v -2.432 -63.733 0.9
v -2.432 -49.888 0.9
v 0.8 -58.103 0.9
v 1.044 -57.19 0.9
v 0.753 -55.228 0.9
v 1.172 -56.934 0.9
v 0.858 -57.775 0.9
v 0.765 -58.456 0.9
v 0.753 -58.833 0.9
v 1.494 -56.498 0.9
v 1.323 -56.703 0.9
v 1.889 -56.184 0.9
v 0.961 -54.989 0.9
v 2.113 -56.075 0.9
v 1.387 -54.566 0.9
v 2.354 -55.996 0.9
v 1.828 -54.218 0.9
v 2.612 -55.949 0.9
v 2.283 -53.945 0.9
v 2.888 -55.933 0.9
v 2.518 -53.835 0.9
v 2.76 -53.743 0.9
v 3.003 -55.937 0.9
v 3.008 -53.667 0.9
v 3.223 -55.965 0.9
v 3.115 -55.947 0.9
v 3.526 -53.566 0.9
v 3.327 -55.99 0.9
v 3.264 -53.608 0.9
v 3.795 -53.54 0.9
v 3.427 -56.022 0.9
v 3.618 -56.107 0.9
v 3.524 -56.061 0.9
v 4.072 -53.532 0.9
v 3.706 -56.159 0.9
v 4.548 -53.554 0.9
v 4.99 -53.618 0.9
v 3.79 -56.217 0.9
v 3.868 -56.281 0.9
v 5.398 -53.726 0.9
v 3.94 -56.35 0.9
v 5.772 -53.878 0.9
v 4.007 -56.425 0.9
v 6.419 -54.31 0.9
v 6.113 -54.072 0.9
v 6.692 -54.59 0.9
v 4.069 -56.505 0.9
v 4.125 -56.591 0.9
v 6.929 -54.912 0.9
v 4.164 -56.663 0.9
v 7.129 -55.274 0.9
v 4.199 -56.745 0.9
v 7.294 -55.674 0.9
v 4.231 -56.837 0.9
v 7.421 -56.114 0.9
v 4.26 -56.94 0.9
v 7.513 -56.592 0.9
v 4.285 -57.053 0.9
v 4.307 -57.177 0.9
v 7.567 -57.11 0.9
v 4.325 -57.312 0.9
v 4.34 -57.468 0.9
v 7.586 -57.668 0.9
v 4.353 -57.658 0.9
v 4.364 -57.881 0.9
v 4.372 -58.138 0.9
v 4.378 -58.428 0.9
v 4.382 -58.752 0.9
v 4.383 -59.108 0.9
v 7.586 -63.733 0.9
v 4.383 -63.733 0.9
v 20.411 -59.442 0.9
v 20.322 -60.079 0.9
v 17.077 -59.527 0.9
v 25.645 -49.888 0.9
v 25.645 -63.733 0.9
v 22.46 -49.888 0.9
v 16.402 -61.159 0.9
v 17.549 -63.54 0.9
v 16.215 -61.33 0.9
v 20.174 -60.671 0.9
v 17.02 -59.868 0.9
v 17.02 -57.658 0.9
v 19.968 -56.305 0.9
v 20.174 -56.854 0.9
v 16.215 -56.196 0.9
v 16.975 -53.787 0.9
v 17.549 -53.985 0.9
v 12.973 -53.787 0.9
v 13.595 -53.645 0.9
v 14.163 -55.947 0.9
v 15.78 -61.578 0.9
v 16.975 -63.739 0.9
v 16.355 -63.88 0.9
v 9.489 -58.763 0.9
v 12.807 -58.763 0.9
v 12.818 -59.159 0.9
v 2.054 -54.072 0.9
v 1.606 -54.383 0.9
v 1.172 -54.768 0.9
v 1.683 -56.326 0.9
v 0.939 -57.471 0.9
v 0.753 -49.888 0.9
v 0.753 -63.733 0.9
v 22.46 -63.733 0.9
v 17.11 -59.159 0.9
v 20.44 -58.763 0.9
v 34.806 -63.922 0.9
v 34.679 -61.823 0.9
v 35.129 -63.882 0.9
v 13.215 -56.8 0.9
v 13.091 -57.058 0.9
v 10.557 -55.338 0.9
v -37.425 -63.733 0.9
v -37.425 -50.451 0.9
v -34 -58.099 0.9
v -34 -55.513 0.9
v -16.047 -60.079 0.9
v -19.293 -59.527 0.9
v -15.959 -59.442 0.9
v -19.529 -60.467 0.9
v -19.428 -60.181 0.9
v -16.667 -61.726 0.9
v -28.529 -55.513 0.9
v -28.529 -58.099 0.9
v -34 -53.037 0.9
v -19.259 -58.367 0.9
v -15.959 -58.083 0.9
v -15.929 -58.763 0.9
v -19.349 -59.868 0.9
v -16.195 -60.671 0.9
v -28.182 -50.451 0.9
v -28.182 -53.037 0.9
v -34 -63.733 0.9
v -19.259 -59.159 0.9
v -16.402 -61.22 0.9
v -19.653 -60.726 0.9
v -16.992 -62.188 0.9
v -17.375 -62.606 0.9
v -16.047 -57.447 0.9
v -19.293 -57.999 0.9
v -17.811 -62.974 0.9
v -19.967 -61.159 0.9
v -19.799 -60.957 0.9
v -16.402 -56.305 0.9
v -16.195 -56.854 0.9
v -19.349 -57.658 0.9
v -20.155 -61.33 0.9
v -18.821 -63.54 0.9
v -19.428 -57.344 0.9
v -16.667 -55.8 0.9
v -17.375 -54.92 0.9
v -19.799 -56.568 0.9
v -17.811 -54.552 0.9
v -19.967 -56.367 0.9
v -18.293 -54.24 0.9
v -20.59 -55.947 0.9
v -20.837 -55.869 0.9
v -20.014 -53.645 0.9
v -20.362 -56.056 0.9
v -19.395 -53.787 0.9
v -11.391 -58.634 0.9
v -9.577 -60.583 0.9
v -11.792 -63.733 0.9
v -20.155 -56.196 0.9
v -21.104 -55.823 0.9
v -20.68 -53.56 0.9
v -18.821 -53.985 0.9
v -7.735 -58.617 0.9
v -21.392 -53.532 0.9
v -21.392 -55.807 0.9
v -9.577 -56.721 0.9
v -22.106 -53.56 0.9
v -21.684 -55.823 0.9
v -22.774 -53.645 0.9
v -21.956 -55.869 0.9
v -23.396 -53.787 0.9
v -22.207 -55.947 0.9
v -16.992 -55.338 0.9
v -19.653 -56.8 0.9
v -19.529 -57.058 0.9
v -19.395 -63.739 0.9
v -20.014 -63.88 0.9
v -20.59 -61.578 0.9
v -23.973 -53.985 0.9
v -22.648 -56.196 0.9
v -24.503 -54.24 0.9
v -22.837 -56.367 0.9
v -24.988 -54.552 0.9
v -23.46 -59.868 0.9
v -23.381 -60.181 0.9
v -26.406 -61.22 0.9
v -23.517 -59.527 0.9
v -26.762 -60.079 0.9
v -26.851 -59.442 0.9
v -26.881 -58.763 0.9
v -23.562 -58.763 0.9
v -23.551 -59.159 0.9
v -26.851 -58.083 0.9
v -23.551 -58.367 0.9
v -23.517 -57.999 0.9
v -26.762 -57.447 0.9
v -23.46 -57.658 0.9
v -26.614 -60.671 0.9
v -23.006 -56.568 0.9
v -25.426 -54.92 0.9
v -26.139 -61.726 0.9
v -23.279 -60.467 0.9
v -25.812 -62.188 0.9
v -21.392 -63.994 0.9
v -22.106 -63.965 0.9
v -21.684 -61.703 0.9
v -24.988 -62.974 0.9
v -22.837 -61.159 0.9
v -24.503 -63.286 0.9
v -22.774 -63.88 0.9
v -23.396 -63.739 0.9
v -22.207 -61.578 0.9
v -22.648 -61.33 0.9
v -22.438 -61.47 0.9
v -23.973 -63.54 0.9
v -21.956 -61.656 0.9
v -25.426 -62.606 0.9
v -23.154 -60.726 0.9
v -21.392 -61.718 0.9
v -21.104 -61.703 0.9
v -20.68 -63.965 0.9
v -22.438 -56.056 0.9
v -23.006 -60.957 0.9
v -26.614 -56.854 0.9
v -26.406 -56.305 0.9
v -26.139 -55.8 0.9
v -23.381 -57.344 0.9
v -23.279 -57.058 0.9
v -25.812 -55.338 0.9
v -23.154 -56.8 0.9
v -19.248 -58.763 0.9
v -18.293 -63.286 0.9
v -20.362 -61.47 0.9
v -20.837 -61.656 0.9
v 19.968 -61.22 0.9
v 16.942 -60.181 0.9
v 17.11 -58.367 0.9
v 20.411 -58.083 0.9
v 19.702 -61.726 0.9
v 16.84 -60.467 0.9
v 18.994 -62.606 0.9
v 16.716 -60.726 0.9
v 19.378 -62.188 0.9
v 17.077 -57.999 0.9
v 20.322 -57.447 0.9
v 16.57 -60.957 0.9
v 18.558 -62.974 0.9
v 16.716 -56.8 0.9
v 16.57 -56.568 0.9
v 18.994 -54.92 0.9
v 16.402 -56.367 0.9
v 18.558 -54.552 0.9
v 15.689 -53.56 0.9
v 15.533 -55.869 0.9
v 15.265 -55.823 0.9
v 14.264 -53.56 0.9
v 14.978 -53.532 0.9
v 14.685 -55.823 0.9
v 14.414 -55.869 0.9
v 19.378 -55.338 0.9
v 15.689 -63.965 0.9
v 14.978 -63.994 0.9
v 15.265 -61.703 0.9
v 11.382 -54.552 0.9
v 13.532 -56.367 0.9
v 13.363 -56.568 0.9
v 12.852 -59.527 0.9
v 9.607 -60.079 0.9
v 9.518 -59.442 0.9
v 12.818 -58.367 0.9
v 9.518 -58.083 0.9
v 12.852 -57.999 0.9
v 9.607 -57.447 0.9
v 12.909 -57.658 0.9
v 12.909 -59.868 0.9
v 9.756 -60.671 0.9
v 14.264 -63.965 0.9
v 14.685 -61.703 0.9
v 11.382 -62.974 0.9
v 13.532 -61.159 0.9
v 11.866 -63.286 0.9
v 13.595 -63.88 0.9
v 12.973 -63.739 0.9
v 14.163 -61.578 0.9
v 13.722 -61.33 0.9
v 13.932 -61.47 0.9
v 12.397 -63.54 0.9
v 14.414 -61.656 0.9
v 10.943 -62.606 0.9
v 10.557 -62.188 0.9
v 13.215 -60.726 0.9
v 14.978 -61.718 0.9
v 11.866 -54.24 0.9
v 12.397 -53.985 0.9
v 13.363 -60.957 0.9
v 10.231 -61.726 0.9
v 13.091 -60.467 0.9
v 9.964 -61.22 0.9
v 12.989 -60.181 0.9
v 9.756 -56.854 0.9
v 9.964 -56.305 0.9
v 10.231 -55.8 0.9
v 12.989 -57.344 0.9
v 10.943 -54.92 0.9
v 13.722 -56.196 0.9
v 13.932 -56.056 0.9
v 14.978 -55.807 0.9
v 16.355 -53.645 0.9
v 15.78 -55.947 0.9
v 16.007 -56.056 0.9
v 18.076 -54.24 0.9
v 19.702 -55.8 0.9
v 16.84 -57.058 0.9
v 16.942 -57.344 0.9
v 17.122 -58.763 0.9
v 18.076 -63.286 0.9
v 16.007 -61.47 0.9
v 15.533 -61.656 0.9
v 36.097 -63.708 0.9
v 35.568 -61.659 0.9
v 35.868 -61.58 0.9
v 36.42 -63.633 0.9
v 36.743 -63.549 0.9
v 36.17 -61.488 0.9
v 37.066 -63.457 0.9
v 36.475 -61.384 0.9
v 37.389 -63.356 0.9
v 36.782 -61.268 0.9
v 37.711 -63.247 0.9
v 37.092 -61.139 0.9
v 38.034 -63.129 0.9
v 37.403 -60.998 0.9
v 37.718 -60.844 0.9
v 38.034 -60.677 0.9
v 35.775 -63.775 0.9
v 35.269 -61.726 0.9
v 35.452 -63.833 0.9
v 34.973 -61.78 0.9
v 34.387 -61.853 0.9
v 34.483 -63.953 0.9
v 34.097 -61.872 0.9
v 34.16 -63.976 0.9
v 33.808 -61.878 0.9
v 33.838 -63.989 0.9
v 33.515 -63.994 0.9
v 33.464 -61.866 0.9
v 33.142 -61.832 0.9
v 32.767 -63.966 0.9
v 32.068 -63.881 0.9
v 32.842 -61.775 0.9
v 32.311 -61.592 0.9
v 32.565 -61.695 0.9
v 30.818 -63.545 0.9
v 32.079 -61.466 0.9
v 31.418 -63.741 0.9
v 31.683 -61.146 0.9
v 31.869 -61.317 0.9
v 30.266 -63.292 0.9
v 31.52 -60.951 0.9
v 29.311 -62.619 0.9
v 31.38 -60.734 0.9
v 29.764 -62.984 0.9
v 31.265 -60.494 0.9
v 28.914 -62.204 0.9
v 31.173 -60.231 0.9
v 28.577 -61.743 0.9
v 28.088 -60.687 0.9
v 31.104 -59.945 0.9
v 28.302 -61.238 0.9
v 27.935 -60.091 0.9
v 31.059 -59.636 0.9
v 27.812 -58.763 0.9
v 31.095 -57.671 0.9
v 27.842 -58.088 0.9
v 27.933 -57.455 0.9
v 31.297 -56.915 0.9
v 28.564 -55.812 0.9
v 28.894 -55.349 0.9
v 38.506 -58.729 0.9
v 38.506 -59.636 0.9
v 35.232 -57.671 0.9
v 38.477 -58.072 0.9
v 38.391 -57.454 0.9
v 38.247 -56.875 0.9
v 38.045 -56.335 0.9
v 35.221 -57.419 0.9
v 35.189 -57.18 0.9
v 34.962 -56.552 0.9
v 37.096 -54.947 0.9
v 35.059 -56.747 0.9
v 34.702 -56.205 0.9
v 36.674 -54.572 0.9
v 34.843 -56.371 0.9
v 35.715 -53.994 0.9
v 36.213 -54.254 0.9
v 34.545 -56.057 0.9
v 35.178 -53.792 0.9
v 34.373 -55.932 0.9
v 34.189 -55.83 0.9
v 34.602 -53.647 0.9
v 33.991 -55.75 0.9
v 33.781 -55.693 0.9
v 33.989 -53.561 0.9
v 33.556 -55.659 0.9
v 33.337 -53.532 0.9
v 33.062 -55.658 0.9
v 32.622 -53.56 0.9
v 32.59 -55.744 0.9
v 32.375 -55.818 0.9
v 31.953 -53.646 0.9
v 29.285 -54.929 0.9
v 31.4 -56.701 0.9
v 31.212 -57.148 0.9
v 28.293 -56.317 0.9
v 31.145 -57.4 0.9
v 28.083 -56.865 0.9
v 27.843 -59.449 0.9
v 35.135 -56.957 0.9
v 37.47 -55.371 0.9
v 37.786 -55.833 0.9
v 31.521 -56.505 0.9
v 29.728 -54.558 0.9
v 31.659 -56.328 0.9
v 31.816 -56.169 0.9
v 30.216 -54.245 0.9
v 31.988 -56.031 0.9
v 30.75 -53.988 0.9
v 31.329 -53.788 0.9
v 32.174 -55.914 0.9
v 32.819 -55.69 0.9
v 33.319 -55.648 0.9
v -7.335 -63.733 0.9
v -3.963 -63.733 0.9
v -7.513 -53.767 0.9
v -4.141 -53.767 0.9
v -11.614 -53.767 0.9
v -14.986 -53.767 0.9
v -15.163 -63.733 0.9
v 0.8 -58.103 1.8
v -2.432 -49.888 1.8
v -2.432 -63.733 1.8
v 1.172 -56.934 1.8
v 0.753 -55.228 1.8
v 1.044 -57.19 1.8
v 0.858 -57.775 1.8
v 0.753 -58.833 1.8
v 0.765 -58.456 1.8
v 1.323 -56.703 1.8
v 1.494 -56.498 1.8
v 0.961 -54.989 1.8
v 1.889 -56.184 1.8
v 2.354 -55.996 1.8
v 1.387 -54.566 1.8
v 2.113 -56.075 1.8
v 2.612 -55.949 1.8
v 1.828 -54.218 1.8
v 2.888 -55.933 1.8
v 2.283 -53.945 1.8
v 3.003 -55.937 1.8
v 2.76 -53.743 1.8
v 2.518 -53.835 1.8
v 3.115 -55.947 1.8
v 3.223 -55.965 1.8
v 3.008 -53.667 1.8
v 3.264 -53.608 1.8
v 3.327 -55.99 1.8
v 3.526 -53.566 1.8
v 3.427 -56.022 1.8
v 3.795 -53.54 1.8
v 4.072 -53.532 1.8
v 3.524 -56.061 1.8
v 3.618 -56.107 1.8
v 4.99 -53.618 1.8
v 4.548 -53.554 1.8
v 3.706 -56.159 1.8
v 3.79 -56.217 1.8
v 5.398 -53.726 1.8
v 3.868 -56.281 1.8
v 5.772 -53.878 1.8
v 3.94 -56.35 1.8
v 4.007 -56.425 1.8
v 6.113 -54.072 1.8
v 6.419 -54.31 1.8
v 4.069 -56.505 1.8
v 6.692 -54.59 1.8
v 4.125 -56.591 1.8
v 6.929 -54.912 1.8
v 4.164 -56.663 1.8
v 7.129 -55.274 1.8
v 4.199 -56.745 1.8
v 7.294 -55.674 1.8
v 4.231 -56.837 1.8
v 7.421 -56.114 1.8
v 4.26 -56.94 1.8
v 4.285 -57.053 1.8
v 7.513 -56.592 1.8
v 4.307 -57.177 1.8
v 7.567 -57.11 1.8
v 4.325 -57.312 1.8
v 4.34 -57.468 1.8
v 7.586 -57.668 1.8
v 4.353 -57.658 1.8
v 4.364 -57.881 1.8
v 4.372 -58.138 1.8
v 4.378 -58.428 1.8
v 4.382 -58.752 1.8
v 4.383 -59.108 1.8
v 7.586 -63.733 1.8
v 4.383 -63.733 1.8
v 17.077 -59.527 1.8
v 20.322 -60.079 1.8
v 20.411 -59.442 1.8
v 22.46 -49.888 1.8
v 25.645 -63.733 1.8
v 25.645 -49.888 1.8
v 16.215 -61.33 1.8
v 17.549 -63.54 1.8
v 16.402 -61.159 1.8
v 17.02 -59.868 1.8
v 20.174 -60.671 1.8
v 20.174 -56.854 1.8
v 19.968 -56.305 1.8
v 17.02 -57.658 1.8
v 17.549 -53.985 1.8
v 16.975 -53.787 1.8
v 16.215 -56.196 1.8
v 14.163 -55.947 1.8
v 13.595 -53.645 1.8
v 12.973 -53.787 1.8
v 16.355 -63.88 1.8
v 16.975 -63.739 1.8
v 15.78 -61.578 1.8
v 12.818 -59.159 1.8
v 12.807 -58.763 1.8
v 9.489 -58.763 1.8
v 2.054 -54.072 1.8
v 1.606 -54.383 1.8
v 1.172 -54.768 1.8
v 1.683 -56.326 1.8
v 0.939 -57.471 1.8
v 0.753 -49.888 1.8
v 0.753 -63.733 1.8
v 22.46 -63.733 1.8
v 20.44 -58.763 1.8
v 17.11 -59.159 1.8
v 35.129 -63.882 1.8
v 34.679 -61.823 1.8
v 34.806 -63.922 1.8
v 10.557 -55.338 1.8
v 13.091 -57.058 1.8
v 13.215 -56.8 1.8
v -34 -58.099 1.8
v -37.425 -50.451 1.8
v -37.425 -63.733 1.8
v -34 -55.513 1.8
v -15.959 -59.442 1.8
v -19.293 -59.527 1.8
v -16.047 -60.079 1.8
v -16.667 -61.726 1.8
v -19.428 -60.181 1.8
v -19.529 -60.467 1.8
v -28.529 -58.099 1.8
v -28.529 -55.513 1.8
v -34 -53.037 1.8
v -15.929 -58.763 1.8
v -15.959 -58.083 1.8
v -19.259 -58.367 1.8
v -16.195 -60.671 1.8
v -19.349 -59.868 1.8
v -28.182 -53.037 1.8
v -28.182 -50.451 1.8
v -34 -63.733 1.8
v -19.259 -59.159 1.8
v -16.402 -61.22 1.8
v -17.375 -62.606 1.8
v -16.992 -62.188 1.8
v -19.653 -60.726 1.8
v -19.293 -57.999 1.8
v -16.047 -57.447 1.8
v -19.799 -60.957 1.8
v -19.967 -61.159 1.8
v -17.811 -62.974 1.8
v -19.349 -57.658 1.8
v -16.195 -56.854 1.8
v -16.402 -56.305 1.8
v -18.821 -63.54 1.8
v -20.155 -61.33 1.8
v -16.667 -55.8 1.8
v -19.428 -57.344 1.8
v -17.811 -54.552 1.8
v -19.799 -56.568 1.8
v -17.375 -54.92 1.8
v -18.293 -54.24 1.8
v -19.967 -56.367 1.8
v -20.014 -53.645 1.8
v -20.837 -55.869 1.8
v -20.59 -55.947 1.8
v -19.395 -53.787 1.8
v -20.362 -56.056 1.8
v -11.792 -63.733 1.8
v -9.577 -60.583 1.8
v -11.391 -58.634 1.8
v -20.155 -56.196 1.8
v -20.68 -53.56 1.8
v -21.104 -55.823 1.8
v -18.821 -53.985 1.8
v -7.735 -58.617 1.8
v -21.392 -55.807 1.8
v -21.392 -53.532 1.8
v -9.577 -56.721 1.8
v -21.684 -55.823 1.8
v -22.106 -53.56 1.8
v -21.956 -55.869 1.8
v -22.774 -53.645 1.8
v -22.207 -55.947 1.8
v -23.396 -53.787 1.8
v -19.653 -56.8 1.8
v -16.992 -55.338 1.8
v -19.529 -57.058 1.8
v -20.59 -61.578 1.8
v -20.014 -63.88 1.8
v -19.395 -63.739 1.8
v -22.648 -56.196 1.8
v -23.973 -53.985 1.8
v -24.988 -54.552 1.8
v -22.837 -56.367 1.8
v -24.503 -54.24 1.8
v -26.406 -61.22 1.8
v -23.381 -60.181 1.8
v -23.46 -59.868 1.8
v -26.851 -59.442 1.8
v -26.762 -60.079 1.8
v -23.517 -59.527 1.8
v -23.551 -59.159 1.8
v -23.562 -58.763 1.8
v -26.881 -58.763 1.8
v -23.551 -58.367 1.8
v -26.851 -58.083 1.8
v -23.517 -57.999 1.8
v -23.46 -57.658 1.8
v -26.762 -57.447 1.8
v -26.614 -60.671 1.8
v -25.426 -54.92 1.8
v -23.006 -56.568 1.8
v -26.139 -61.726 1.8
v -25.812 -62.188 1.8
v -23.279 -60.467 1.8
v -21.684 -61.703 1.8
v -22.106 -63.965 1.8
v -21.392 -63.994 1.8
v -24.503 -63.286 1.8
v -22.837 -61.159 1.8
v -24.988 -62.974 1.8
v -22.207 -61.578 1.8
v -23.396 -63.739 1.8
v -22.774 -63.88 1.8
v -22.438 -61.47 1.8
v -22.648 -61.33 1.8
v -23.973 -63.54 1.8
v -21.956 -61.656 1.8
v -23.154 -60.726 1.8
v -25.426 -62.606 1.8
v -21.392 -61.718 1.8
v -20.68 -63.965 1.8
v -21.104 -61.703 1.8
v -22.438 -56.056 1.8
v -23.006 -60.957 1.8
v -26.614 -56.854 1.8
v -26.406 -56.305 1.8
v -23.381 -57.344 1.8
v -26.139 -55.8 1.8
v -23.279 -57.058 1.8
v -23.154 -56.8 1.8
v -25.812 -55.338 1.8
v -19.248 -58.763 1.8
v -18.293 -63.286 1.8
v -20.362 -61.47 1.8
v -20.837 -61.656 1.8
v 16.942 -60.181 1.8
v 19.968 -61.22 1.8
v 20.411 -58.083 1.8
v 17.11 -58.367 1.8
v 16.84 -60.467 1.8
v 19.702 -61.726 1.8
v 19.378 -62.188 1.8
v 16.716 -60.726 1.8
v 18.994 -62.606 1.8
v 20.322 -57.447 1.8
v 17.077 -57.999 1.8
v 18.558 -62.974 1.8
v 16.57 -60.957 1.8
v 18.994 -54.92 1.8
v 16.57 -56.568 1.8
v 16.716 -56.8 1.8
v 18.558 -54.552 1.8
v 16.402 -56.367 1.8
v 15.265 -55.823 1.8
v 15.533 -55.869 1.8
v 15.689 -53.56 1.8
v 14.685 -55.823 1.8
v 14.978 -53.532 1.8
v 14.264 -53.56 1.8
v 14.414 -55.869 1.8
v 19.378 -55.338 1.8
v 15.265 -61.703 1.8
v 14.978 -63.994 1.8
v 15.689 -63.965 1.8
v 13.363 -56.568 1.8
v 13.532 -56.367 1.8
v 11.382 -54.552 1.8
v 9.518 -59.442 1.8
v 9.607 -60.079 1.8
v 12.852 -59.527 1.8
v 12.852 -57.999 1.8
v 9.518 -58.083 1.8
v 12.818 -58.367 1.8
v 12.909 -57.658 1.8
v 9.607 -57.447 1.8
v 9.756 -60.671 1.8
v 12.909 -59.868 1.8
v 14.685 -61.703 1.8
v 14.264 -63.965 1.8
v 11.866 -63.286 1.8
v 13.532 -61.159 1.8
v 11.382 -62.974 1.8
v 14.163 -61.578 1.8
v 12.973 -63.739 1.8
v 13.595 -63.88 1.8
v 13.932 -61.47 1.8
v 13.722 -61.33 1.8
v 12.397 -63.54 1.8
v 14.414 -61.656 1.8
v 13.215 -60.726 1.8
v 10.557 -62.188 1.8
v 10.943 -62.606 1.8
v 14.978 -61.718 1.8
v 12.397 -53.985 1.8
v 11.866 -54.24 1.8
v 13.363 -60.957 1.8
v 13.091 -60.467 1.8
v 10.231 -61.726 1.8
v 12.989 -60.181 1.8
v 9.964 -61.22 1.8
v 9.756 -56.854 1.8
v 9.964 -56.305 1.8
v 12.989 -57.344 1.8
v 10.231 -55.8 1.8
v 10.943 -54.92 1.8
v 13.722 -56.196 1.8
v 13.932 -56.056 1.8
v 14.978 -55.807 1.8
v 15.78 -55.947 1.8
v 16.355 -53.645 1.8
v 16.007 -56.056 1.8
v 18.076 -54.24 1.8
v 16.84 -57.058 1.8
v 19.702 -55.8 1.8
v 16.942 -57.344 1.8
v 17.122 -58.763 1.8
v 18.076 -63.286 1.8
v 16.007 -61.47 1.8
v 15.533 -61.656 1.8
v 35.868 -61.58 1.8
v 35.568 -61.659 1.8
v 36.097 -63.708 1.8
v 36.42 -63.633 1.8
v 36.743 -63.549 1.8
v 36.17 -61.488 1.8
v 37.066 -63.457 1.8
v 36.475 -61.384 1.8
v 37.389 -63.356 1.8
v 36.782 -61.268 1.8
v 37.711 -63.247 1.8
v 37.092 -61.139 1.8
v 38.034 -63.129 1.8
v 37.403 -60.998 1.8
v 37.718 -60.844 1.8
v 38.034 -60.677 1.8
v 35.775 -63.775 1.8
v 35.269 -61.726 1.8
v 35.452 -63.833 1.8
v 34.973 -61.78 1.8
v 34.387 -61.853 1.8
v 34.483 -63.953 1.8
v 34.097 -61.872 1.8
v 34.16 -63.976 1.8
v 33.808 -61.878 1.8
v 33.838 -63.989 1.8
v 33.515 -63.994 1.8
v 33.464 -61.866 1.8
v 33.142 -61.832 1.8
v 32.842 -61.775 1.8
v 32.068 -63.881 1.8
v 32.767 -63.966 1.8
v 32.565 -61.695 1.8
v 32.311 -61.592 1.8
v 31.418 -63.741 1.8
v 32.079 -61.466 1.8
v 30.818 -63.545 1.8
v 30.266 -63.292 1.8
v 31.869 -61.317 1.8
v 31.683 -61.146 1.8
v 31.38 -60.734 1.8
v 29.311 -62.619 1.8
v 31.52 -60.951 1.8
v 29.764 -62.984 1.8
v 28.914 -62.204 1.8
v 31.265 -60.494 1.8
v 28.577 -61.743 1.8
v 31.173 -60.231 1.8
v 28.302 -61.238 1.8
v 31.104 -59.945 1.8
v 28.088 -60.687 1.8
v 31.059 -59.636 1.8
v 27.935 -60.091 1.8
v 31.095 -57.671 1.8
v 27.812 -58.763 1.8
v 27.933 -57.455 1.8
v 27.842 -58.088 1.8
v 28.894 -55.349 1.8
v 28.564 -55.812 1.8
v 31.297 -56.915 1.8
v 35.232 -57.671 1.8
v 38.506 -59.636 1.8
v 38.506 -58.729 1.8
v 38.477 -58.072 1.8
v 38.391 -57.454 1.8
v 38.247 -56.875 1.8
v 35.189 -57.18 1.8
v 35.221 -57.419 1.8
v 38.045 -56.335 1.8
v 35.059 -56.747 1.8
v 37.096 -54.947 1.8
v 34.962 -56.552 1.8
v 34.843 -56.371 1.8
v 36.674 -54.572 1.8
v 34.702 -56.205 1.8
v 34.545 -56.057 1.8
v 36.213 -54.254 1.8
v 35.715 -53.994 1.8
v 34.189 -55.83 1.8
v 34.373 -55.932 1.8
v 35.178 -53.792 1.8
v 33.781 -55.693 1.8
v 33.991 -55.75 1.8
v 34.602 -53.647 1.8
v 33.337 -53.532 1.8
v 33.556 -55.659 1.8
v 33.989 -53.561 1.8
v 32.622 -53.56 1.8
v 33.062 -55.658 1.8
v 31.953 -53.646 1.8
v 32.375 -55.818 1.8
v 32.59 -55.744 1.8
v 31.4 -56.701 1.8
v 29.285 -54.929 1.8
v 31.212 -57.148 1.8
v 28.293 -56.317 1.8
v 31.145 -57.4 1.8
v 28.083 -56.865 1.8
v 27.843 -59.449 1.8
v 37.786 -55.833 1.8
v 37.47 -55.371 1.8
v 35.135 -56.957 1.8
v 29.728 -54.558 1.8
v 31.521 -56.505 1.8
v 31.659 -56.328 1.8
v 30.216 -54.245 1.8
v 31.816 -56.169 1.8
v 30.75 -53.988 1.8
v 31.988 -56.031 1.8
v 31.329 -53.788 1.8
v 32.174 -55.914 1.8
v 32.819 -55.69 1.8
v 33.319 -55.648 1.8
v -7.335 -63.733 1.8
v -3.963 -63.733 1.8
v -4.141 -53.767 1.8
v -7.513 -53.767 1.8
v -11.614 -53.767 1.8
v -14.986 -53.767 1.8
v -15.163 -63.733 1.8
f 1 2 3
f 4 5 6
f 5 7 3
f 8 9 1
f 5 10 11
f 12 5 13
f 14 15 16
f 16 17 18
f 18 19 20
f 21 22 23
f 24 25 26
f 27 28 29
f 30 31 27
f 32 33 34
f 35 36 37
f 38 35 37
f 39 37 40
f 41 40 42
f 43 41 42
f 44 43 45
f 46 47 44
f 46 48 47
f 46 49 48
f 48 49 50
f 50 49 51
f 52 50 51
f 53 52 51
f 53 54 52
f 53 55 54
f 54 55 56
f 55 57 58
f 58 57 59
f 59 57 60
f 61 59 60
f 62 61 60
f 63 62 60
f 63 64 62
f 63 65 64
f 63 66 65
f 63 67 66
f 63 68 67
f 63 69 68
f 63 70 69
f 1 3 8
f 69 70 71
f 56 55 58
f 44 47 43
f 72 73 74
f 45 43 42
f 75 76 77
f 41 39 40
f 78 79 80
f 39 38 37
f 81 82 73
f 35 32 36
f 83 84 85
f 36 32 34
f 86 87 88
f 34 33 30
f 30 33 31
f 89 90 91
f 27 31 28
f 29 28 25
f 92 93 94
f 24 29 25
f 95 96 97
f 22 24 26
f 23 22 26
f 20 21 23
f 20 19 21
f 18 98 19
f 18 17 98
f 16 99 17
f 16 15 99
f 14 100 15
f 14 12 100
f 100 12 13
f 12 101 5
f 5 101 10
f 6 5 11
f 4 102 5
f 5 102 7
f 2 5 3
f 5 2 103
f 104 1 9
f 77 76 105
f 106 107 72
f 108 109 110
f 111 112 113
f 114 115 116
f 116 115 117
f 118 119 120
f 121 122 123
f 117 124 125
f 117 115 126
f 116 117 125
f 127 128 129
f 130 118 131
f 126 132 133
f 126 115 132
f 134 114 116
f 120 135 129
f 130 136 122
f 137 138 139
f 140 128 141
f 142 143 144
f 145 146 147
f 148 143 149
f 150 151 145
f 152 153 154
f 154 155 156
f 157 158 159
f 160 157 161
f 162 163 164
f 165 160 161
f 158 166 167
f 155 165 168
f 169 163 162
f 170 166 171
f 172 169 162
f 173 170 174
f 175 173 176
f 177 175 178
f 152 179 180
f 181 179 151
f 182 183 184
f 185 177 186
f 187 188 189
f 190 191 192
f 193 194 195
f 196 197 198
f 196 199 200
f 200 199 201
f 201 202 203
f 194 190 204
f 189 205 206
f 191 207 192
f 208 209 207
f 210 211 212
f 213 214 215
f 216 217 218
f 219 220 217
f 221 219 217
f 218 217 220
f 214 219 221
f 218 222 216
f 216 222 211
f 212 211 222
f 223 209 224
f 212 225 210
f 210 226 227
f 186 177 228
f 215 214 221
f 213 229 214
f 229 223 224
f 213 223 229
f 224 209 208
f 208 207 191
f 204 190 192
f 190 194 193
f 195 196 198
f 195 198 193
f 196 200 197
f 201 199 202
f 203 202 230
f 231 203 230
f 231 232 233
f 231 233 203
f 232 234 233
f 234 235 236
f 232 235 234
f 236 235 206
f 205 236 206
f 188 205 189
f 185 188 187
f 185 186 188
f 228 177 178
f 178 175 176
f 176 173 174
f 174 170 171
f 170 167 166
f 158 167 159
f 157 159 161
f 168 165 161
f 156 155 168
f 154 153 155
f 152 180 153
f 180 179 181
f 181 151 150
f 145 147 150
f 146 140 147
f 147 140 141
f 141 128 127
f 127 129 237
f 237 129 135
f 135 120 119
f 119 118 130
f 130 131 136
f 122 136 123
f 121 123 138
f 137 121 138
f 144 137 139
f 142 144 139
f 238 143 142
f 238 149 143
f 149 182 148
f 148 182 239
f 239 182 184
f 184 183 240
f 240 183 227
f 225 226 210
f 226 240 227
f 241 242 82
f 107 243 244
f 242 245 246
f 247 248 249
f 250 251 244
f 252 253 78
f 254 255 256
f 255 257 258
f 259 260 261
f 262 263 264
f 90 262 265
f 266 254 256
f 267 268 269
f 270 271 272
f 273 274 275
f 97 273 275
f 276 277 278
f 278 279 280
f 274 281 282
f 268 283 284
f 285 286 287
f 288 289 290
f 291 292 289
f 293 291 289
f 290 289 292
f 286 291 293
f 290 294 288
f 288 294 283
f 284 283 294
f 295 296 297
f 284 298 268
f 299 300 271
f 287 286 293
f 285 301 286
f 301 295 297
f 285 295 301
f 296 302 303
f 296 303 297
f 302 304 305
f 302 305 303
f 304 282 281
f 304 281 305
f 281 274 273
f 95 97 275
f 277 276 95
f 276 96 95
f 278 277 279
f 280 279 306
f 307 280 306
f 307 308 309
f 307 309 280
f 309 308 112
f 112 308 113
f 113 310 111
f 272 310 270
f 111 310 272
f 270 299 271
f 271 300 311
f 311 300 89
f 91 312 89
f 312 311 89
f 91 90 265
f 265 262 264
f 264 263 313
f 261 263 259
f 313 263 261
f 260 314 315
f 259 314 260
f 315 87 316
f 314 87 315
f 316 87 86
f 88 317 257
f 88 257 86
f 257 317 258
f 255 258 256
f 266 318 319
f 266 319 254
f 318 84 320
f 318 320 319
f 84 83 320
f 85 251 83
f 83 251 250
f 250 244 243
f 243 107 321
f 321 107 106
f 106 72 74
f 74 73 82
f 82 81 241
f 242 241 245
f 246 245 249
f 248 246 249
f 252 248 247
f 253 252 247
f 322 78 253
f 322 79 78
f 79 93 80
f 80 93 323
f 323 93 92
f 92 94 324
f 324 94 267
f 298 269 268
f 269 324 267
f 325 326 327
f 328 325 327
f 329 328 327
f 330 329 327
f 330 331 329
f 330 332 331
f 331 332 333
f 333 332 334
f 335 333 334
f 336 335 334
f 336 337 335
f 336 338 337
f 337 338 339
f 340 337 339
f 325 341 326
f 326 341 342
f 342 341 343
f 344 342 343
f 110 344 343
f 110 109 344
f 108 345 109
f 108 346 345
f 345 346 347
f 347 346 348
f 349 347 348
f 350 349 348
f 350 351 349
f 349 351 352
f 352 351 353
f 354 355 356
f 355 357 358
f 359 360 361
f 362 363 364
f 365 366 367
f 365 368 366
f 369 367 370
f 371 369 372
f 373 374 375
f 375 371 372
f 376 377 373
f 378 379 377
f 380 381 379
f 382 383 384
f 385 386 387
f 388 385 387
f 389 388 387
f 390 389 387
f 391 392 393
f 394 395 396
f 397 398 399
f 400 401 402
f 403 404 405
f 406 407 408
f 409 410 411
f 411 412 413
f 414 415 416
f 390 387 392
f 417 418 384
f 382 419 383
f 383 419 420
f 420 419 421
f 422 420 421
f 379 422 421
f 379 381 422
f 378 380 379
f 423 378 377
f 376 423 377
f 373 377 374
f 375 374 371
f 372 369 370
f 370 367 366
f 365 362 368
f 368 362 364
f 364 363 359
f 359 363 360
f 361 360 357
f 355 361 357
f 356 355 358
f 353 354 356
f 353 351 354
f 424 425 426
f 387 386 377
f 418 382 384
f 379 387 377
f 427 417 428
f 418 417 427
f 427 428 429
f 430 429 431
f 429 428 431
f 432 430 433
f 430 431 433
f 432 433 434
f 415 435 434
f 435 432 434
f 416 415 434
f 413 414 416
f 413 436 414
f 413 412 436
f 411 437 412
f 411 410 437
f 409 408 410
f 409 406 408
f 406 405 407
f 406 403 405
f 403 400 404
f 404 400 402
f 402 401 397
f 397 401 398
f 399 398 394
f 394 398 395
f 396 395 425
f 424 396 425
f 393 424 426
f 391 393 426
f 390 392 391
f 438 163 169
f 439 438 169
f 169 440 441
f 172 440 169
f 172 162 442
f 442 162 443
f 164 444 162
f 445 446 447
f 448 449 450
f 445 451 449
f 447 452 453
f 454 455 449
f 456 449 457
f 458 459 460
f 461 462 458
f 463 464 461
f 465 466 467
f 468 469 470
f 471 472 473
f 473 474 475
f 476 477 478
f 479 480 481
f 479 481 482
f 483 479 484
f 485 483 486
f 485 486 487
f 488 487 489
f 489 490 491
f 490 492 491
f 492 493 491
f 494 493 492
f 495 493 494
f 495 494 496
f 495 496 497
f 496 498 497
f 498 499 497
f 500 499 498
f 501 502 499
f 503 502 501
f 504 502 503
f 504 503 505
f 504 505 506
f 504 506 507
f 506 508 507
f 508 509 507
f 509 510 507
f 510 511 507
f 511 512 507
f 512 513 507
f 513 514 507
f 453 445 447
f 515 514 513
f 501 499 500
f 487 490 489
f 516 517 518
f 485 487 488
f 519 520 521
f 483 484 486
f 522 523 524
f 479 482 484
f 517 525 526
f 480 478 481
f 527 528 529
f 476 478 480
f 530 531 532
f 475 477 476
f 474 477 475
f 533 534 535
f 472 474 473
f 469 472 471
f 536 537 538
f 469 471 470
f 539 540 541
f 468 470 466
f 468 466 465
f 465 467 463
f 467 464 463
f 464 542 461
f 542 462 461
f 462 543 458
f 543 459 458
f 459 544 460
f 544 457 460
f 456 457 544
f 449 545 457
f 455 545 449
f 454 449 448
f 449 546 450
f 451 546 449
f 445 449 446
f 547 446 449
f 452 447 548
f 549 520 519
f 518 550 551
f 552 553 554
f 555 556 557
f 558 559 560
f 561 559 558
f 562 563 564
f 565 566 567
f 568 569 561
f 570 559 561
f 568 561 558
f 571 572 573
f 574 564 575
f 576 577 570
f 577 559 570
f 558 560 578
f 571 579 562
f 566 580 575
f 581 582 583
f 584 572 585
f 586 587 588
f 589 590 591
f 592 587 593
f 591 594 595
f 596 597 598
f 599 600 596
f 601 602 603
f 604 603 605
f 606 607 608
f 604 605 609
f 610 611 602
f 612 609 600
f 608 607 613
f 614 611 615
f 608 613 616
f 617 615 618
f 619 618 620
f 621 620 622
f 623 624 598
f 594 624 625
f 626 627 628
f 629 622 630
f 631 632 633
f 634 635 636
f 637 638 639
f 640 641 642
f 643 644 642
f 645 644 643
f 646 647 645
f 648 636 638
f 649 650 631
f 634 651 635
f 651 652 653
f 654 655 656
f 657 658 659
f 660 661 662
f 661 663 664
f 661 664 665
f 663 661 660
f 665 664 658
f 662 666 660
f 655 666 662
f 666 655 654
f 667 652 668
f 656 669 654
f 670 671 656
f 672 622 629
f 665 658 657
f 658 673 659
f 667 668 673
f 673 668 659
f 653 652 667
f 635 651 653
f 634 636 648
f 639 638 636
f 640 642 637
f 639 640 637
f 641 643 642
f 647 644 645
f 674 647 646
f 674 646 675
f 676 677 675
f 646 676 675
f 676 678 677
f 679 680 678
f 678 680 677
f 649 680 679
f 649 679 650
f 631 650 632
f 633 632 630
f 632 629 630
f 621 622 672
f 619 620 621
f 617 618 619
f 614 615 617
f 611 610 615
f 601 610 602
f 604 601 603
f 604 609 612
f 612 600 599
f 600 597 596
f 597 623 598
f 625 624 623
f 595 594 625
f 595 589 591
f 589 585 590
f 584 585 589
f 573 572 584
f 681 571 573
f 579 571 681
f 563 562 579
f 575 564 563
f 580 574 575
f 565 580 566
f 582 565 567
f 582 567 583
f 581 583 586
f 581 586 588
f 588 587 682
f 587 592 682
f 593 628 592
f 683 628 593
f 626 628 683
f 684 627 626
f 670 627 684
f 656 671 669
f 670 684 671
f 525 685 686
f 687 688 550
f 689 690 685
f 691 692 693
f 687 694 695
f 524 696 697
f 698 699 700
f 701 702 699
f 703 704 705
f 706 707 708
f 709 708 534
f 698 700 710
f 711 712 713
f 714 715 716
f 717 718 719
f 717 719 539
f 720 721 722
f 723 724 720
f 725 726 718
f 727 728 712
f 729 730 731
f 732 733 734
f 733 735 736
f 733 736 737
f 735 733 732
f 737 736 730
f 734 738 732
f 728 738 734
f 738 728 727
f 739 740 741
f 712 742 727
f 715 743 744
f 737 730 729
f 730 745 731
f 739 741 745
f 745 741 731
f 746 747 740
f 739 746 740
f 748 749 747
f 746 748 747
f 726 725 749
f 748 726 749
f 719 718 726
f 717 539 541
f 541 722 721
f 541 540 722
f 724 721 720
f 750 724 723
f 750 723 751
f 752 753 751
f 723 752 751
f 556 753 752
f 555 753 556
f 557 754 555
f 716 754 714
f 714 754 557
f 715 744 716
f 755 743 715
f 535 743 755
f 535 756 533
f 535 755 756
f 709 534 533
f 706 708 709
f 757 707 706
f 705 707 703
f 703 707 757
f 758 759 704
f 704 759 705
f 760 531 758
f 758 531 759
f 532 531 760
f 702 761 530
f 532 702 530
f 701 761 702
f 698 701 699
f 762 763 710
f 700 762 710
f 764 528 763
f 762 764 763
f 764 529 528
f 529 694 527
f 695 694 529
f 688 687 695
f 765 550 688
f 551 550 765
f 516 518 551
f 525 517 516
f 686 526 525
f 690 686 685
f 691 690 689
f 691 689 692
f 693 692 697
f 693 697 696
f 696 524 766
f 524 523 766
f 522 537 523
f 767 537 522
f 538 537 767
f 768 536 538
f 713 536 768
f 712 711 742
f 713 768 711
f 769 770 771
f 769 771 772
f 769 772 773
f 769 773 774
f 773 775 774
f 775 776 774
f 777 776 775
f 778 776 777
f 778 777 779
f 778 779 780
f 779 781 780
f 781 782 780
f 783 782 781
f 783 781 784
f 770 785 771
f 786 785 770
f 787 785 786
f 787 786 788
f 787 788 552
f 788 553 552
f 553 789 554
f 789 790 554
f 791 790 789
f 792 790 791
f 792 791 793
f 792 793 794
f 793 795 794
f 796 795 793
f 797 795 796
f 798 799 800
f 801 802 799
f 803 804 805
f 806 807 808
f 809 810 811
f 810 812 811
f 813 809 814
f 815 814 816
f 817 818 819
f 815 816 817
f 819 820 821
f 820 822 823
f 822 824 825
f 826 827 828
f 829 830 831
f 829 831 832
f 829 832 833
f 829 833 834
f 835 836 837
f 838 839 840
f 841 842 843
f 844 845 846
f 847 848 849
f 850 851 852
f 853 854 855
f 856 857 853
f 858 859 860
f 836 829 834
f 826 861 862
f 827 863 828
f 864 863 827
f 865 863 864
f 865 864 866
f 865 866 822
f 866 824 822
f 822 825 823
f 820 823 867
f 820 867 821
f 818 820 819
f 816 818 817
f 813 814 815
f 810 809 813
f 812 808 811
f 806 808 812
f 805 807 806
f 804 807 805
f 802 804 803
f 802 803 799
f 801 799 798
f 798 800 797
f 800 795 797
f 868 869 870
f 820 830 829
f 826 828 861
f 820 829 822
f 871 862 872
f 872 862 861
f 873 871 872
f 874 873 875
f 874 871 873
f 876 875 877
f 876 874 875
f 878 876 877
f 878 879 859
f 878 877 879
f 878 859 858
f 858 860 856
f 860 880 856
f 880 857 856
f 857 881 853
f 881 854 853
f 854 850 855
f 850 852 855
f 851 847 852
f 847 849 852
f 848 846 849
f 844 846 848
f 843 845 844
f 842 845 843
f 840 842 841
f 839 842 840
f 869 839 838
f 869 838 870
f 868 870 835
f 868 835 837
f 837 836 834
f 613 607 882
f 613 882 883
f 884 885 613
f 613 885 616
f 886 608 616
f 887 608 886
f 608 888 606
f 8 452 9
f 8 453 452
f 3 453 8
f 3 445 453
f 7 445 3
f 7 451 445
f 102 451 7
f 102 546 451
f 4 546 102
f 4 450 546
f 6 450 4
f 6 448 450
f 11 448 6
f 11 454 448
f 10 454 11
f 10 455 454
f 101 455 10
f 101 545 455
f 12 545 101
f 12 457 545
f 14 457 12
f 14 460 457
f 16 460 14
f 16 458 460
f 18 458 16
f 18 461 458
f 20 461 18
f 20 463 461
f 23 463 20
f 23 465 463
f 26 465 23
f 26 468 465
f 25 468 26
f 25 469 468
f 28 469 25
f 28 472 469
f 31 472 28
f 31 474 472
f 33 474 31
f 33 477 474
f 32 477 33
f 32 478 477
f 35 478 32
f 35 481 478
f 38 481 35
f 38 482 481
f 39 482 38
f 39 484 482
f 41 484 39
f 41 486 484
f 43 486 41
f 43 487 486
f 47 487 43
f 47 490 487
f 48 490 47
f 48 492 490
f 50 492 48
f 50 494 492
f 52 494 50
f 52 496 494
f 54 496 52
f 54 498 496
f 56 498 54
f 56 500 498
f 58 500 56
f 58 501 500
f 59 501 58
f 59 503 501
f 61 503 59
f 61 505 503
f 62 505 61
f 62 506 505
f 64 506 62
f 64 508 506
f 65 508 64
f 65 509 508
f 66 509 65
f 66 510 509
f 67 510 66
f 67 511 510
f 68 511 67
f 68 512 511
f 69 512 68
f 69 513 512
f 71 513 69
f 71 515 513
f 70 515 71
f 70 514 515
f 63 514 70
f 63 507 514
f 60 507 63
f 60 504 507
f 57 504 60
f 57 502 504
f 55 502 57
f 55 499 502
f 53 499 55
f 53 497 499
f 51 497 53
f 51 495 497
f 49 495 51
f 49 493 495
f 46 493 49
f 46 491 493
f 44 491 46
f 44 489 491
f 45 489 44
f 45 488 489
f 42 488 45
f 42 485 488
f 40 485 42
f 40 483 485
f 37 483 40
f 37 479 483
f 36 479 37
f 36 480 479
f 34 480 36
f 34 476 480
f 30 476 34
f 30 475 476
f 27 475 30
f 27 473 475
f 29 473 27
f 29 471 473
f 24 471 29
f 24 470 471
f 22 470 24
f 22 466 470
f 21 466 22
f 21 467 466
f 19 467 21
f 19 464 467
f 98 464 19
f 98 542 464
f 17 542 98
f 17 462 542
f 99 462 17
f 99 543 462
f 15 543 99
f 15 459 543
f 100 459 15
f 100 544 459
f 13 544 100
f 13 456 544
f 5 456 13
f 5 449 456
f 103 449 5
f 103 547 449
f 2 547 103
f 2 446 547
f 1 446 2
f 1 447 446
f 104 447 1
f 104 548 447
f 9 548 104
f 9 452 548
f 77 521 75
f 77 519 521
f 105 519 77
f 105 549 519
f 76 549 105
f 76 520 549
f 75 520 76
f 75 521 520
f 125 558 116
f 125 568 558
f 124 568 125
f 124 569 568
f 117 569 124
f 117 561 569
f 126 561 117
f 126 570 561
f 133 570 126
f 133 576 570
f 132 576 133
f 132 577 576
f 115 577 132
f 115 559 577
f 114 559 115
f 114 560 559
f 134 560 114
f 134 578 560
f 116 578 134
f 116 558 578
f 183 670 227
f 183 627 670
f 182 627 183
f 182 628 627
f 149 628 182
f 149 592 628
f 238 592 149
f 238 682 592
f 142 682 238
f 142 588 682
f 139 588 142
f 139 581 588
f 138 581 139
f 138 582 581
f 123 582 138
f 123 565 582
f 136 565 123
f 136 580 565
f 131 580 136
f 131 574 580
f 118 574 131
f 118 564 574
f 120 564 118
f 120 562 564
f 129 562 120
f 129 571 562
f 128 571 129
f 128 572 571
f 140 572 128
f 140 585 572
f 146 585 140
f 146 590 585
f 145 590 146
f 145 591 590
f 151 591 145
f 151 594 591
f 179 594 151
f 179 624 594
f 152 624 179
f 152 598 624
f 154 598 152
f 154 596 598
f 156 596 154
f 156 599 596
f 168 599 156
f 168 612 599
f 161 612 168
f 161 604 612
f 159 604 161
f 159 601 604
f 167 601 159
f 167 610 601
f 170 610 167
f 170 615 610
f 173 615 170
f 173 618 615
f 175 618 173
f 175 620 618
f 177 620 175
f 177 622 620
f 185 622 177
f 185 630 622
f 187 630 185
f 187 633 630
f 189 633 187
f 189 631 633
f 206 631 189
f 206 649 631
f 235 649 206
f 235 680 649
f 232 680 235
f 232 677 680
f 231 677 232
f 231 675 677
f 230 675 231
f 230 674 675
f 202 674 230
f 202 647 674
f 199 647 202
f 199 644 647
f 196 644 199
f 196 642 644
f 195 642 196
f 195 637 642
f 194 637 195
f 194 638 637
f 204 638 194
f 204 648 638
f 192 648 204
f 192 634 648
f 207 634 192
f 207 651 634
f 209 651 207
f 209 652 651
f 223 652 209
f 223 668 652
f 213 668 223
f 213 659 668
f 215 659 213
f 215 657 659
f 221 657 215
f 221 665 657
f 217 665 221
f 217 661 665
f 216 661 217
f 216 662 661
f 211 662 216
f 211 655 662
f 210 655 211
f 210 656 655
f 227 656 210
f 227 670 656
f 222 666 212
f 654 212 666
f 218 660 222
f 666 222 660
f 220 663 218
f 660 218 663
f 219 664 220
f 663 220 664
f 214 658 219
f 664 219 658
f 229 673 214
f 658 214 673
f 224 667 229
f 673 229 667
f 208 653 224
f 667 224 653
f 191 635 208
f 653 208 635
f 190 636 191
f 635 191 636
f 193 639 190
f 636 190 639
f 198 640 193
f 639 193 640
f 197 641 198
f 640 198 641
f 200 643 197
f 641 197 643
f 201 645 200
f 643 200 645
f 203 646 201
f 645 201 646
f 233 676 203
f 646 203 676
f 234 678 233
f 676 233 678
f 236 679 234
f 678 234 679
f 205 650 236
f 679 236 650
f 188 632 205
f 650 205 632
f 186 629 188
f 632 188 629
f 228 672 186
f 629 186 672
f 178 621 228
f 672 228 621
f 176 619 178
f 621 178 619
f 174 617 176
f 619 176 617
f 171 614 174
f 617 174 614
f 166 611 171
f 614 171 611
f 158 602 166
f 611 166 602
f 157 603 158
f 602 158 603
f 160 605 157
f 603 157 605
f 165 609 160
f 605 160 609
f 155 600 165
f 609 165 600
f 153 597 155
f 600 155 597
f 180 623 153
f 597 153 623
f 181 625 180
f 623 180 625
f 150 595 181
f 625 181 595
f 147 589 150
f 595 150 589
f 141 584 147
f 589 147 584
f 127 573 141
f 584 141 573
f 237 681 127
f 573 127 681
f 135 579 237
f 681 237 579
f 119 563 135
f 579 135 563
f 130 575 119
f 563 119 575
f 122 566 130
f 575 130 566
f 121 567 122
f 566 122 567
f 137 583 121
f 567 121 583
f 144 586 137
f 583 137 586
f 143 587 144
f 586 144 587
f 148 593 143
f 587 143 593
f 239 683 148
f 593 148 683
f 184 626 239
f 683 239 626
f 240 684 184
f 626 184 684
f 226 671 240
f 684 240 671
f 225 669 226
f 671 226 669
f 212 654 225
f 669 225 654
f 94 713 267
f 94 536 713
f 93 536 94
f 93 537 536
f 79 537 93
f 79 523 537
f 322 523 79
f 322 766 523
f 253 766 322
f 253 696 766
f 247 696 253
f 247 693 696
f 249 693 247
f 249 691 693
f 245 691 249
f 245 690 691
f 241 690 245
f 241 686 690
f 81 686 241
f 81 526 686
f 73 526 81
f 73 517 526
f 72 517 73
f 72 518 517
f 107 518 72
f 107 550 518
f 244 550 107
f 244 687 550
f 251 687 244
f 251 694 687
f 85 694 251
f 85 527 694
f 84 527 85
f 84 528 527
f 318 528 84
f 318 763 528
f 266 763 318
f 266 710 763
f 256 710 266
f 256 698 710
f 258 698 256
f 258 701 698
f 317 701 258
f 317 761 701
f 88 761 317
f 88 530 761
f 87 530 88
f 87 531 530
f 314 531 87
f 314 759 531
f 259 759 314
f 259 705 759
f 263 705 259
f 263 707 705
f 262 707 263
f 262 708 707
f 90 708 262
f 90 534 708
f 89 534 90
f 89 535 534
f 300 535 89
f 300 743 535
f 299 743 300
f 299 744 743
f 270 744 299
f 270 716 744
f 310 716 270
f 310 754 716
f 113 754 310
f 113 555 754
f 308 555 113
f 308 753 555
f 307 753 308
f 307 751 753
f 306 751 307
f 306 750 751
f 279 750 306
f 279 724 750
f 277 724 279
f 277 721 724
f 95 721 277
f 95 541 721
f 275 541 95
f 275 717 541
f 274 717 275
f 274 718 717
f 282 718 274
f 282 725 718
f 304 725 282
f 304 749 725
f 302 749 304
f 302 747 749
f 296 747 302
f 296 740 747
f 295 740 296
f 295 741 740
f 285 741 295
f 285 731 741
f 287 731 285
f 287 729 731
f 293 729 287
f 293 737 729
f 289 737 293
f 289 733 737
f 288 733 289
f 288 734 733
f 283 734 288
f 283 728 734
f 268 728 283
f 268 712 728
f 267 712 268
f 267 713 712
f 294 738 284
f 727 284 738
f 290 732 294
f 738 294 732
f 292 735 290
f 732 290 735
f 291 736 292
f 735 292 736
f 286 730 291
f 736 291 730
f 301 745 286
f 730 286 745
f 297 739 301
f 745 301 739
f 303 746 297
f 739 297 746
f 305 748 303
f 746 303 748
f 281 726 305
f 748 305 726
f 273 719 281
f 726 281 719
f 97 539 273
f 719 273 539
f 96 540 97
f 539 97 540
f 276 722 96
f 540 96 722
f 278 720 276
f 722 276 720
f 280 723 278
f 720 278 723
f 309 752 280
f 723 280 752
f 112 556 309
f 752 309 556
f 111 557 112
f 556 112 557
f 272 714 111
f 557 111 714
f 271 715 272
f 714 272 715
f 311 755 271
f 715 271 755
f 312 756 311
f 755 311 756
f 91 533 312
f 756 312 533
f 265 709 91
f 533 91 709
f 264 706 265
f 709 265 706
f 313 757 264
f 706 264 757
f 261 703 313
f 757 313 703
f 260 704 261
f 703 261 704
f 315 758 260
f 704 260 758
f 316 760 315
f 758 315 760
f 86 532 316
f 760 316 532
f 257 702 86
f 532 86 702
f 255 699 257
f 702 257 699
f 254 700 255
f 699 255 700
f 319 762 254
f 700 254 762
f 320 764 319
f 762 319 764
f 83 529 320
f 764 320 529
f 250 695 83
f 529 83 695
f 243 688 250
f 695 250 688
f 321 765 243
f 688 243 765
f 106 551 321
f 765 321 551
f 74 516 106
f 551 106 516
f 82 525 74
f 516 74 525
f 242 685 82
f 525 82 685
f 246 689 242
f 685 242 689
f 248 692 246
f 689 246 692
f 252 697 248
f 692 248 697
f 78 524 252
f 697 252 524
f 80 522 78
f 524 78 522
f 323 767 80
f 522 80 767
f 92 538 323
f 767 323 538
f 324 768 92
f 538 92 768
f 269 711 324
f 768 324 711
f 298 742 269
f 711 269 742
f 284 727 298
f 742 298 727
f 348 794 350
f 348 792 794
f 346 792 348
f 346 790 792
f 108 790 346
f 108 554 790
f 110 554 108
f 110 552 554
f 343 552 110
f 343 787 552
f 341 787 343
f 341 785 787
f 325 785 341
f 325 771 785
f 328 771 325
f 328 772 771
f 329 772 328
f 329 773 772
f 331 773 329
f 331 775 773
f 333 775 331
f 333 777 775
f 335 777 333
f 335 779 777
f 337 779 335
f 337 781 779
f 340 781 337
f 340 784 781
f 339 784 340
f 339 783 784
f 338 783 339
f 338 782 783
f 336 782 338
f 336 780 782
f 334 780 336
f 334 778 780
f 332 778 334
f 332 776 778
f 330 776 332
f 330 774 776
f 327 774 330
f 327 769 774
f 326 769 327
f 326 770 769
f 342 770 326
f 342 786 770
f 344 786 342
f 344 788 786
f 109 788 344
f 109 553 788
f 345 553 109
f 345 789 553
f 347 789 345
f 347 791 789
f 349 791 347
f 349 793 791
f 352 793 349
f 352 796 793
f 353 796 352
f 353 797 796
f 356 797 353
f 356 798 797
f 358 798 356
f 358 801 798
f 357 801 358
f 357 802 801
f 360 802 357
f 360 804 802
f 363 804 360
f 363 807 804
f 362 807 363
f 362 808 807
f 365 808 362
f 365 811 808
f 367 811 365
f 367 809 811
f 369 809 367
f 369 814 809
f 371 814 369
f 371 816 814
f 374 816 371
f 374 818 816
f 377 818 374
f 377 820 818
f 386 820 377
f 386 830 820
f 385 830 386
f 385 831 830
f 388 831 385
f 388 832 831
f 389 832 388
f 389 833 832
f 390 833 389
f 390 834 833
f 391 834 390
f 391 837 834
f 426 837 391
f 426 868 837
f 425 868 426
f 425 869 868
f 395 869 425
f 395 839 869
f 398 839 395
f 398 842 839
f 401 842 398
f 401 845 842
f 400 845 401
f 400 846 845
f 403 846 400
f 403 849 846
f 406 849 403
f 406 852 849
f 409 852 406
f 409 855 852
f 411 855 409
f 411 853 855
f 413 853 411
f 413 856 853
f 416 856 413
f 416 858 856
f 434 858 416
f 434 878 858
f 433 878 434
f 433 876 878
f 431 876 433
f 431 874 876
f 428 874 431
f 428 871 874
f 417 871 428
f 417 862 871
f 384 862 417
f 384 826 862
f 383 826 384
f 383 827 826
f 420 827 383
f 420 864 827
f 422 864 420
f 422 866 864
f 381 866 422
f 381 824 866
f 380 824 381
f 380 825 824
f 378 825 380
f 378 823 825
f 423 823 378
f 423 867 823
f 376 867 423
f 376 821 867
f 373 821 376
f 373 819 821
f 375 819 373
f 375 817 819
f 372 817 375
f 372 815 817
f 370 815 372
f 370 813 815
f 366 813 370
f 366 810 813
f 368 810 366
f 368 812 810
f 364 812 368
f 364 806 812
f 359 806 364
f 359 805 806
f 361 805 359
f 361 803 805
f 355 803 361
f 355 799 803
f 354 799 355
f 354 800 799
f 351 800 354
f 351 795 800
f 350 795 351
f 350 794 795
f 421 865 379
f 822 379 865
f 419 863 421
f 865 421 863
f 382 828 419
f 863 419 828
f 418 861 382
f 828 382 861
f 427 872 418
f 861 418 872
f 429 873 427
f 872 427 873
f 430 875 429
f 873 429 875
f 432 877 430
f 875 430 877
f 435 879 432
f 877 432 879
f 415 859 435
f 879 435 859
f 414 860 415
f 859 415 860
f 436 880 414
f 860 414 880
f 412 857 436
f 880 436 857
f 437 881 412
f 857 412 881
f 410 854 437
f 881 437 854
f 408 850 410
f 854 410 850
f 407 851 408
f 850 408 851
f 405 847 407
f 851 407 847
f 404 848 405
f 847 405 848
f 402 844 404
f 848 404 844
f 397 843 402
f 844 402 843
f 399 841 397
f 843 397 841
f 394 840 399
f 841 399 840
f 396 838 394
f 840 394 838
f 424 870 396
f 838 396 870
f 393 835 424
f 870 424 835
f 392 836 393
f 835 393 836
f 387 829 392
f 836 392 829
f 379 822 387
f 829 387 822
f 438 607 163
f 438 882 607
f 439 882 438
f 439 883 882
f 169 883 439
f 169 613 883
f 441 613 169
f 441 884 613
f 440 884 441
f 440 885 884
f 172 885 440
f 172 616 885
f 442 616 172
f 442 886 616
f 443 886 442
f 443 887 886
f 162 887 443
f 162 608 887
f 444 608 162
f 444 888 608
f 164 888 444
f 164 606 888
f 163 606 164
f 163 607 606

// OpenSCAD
$fn = 48;
  // English (below bottom hole)
  translate([0, -57.100, 0.900]) linear_extrude(height=0.900) text("Foxhole", size=13.119, halign="center", valign="center", font="Helvetica Neue:style=Bold");
